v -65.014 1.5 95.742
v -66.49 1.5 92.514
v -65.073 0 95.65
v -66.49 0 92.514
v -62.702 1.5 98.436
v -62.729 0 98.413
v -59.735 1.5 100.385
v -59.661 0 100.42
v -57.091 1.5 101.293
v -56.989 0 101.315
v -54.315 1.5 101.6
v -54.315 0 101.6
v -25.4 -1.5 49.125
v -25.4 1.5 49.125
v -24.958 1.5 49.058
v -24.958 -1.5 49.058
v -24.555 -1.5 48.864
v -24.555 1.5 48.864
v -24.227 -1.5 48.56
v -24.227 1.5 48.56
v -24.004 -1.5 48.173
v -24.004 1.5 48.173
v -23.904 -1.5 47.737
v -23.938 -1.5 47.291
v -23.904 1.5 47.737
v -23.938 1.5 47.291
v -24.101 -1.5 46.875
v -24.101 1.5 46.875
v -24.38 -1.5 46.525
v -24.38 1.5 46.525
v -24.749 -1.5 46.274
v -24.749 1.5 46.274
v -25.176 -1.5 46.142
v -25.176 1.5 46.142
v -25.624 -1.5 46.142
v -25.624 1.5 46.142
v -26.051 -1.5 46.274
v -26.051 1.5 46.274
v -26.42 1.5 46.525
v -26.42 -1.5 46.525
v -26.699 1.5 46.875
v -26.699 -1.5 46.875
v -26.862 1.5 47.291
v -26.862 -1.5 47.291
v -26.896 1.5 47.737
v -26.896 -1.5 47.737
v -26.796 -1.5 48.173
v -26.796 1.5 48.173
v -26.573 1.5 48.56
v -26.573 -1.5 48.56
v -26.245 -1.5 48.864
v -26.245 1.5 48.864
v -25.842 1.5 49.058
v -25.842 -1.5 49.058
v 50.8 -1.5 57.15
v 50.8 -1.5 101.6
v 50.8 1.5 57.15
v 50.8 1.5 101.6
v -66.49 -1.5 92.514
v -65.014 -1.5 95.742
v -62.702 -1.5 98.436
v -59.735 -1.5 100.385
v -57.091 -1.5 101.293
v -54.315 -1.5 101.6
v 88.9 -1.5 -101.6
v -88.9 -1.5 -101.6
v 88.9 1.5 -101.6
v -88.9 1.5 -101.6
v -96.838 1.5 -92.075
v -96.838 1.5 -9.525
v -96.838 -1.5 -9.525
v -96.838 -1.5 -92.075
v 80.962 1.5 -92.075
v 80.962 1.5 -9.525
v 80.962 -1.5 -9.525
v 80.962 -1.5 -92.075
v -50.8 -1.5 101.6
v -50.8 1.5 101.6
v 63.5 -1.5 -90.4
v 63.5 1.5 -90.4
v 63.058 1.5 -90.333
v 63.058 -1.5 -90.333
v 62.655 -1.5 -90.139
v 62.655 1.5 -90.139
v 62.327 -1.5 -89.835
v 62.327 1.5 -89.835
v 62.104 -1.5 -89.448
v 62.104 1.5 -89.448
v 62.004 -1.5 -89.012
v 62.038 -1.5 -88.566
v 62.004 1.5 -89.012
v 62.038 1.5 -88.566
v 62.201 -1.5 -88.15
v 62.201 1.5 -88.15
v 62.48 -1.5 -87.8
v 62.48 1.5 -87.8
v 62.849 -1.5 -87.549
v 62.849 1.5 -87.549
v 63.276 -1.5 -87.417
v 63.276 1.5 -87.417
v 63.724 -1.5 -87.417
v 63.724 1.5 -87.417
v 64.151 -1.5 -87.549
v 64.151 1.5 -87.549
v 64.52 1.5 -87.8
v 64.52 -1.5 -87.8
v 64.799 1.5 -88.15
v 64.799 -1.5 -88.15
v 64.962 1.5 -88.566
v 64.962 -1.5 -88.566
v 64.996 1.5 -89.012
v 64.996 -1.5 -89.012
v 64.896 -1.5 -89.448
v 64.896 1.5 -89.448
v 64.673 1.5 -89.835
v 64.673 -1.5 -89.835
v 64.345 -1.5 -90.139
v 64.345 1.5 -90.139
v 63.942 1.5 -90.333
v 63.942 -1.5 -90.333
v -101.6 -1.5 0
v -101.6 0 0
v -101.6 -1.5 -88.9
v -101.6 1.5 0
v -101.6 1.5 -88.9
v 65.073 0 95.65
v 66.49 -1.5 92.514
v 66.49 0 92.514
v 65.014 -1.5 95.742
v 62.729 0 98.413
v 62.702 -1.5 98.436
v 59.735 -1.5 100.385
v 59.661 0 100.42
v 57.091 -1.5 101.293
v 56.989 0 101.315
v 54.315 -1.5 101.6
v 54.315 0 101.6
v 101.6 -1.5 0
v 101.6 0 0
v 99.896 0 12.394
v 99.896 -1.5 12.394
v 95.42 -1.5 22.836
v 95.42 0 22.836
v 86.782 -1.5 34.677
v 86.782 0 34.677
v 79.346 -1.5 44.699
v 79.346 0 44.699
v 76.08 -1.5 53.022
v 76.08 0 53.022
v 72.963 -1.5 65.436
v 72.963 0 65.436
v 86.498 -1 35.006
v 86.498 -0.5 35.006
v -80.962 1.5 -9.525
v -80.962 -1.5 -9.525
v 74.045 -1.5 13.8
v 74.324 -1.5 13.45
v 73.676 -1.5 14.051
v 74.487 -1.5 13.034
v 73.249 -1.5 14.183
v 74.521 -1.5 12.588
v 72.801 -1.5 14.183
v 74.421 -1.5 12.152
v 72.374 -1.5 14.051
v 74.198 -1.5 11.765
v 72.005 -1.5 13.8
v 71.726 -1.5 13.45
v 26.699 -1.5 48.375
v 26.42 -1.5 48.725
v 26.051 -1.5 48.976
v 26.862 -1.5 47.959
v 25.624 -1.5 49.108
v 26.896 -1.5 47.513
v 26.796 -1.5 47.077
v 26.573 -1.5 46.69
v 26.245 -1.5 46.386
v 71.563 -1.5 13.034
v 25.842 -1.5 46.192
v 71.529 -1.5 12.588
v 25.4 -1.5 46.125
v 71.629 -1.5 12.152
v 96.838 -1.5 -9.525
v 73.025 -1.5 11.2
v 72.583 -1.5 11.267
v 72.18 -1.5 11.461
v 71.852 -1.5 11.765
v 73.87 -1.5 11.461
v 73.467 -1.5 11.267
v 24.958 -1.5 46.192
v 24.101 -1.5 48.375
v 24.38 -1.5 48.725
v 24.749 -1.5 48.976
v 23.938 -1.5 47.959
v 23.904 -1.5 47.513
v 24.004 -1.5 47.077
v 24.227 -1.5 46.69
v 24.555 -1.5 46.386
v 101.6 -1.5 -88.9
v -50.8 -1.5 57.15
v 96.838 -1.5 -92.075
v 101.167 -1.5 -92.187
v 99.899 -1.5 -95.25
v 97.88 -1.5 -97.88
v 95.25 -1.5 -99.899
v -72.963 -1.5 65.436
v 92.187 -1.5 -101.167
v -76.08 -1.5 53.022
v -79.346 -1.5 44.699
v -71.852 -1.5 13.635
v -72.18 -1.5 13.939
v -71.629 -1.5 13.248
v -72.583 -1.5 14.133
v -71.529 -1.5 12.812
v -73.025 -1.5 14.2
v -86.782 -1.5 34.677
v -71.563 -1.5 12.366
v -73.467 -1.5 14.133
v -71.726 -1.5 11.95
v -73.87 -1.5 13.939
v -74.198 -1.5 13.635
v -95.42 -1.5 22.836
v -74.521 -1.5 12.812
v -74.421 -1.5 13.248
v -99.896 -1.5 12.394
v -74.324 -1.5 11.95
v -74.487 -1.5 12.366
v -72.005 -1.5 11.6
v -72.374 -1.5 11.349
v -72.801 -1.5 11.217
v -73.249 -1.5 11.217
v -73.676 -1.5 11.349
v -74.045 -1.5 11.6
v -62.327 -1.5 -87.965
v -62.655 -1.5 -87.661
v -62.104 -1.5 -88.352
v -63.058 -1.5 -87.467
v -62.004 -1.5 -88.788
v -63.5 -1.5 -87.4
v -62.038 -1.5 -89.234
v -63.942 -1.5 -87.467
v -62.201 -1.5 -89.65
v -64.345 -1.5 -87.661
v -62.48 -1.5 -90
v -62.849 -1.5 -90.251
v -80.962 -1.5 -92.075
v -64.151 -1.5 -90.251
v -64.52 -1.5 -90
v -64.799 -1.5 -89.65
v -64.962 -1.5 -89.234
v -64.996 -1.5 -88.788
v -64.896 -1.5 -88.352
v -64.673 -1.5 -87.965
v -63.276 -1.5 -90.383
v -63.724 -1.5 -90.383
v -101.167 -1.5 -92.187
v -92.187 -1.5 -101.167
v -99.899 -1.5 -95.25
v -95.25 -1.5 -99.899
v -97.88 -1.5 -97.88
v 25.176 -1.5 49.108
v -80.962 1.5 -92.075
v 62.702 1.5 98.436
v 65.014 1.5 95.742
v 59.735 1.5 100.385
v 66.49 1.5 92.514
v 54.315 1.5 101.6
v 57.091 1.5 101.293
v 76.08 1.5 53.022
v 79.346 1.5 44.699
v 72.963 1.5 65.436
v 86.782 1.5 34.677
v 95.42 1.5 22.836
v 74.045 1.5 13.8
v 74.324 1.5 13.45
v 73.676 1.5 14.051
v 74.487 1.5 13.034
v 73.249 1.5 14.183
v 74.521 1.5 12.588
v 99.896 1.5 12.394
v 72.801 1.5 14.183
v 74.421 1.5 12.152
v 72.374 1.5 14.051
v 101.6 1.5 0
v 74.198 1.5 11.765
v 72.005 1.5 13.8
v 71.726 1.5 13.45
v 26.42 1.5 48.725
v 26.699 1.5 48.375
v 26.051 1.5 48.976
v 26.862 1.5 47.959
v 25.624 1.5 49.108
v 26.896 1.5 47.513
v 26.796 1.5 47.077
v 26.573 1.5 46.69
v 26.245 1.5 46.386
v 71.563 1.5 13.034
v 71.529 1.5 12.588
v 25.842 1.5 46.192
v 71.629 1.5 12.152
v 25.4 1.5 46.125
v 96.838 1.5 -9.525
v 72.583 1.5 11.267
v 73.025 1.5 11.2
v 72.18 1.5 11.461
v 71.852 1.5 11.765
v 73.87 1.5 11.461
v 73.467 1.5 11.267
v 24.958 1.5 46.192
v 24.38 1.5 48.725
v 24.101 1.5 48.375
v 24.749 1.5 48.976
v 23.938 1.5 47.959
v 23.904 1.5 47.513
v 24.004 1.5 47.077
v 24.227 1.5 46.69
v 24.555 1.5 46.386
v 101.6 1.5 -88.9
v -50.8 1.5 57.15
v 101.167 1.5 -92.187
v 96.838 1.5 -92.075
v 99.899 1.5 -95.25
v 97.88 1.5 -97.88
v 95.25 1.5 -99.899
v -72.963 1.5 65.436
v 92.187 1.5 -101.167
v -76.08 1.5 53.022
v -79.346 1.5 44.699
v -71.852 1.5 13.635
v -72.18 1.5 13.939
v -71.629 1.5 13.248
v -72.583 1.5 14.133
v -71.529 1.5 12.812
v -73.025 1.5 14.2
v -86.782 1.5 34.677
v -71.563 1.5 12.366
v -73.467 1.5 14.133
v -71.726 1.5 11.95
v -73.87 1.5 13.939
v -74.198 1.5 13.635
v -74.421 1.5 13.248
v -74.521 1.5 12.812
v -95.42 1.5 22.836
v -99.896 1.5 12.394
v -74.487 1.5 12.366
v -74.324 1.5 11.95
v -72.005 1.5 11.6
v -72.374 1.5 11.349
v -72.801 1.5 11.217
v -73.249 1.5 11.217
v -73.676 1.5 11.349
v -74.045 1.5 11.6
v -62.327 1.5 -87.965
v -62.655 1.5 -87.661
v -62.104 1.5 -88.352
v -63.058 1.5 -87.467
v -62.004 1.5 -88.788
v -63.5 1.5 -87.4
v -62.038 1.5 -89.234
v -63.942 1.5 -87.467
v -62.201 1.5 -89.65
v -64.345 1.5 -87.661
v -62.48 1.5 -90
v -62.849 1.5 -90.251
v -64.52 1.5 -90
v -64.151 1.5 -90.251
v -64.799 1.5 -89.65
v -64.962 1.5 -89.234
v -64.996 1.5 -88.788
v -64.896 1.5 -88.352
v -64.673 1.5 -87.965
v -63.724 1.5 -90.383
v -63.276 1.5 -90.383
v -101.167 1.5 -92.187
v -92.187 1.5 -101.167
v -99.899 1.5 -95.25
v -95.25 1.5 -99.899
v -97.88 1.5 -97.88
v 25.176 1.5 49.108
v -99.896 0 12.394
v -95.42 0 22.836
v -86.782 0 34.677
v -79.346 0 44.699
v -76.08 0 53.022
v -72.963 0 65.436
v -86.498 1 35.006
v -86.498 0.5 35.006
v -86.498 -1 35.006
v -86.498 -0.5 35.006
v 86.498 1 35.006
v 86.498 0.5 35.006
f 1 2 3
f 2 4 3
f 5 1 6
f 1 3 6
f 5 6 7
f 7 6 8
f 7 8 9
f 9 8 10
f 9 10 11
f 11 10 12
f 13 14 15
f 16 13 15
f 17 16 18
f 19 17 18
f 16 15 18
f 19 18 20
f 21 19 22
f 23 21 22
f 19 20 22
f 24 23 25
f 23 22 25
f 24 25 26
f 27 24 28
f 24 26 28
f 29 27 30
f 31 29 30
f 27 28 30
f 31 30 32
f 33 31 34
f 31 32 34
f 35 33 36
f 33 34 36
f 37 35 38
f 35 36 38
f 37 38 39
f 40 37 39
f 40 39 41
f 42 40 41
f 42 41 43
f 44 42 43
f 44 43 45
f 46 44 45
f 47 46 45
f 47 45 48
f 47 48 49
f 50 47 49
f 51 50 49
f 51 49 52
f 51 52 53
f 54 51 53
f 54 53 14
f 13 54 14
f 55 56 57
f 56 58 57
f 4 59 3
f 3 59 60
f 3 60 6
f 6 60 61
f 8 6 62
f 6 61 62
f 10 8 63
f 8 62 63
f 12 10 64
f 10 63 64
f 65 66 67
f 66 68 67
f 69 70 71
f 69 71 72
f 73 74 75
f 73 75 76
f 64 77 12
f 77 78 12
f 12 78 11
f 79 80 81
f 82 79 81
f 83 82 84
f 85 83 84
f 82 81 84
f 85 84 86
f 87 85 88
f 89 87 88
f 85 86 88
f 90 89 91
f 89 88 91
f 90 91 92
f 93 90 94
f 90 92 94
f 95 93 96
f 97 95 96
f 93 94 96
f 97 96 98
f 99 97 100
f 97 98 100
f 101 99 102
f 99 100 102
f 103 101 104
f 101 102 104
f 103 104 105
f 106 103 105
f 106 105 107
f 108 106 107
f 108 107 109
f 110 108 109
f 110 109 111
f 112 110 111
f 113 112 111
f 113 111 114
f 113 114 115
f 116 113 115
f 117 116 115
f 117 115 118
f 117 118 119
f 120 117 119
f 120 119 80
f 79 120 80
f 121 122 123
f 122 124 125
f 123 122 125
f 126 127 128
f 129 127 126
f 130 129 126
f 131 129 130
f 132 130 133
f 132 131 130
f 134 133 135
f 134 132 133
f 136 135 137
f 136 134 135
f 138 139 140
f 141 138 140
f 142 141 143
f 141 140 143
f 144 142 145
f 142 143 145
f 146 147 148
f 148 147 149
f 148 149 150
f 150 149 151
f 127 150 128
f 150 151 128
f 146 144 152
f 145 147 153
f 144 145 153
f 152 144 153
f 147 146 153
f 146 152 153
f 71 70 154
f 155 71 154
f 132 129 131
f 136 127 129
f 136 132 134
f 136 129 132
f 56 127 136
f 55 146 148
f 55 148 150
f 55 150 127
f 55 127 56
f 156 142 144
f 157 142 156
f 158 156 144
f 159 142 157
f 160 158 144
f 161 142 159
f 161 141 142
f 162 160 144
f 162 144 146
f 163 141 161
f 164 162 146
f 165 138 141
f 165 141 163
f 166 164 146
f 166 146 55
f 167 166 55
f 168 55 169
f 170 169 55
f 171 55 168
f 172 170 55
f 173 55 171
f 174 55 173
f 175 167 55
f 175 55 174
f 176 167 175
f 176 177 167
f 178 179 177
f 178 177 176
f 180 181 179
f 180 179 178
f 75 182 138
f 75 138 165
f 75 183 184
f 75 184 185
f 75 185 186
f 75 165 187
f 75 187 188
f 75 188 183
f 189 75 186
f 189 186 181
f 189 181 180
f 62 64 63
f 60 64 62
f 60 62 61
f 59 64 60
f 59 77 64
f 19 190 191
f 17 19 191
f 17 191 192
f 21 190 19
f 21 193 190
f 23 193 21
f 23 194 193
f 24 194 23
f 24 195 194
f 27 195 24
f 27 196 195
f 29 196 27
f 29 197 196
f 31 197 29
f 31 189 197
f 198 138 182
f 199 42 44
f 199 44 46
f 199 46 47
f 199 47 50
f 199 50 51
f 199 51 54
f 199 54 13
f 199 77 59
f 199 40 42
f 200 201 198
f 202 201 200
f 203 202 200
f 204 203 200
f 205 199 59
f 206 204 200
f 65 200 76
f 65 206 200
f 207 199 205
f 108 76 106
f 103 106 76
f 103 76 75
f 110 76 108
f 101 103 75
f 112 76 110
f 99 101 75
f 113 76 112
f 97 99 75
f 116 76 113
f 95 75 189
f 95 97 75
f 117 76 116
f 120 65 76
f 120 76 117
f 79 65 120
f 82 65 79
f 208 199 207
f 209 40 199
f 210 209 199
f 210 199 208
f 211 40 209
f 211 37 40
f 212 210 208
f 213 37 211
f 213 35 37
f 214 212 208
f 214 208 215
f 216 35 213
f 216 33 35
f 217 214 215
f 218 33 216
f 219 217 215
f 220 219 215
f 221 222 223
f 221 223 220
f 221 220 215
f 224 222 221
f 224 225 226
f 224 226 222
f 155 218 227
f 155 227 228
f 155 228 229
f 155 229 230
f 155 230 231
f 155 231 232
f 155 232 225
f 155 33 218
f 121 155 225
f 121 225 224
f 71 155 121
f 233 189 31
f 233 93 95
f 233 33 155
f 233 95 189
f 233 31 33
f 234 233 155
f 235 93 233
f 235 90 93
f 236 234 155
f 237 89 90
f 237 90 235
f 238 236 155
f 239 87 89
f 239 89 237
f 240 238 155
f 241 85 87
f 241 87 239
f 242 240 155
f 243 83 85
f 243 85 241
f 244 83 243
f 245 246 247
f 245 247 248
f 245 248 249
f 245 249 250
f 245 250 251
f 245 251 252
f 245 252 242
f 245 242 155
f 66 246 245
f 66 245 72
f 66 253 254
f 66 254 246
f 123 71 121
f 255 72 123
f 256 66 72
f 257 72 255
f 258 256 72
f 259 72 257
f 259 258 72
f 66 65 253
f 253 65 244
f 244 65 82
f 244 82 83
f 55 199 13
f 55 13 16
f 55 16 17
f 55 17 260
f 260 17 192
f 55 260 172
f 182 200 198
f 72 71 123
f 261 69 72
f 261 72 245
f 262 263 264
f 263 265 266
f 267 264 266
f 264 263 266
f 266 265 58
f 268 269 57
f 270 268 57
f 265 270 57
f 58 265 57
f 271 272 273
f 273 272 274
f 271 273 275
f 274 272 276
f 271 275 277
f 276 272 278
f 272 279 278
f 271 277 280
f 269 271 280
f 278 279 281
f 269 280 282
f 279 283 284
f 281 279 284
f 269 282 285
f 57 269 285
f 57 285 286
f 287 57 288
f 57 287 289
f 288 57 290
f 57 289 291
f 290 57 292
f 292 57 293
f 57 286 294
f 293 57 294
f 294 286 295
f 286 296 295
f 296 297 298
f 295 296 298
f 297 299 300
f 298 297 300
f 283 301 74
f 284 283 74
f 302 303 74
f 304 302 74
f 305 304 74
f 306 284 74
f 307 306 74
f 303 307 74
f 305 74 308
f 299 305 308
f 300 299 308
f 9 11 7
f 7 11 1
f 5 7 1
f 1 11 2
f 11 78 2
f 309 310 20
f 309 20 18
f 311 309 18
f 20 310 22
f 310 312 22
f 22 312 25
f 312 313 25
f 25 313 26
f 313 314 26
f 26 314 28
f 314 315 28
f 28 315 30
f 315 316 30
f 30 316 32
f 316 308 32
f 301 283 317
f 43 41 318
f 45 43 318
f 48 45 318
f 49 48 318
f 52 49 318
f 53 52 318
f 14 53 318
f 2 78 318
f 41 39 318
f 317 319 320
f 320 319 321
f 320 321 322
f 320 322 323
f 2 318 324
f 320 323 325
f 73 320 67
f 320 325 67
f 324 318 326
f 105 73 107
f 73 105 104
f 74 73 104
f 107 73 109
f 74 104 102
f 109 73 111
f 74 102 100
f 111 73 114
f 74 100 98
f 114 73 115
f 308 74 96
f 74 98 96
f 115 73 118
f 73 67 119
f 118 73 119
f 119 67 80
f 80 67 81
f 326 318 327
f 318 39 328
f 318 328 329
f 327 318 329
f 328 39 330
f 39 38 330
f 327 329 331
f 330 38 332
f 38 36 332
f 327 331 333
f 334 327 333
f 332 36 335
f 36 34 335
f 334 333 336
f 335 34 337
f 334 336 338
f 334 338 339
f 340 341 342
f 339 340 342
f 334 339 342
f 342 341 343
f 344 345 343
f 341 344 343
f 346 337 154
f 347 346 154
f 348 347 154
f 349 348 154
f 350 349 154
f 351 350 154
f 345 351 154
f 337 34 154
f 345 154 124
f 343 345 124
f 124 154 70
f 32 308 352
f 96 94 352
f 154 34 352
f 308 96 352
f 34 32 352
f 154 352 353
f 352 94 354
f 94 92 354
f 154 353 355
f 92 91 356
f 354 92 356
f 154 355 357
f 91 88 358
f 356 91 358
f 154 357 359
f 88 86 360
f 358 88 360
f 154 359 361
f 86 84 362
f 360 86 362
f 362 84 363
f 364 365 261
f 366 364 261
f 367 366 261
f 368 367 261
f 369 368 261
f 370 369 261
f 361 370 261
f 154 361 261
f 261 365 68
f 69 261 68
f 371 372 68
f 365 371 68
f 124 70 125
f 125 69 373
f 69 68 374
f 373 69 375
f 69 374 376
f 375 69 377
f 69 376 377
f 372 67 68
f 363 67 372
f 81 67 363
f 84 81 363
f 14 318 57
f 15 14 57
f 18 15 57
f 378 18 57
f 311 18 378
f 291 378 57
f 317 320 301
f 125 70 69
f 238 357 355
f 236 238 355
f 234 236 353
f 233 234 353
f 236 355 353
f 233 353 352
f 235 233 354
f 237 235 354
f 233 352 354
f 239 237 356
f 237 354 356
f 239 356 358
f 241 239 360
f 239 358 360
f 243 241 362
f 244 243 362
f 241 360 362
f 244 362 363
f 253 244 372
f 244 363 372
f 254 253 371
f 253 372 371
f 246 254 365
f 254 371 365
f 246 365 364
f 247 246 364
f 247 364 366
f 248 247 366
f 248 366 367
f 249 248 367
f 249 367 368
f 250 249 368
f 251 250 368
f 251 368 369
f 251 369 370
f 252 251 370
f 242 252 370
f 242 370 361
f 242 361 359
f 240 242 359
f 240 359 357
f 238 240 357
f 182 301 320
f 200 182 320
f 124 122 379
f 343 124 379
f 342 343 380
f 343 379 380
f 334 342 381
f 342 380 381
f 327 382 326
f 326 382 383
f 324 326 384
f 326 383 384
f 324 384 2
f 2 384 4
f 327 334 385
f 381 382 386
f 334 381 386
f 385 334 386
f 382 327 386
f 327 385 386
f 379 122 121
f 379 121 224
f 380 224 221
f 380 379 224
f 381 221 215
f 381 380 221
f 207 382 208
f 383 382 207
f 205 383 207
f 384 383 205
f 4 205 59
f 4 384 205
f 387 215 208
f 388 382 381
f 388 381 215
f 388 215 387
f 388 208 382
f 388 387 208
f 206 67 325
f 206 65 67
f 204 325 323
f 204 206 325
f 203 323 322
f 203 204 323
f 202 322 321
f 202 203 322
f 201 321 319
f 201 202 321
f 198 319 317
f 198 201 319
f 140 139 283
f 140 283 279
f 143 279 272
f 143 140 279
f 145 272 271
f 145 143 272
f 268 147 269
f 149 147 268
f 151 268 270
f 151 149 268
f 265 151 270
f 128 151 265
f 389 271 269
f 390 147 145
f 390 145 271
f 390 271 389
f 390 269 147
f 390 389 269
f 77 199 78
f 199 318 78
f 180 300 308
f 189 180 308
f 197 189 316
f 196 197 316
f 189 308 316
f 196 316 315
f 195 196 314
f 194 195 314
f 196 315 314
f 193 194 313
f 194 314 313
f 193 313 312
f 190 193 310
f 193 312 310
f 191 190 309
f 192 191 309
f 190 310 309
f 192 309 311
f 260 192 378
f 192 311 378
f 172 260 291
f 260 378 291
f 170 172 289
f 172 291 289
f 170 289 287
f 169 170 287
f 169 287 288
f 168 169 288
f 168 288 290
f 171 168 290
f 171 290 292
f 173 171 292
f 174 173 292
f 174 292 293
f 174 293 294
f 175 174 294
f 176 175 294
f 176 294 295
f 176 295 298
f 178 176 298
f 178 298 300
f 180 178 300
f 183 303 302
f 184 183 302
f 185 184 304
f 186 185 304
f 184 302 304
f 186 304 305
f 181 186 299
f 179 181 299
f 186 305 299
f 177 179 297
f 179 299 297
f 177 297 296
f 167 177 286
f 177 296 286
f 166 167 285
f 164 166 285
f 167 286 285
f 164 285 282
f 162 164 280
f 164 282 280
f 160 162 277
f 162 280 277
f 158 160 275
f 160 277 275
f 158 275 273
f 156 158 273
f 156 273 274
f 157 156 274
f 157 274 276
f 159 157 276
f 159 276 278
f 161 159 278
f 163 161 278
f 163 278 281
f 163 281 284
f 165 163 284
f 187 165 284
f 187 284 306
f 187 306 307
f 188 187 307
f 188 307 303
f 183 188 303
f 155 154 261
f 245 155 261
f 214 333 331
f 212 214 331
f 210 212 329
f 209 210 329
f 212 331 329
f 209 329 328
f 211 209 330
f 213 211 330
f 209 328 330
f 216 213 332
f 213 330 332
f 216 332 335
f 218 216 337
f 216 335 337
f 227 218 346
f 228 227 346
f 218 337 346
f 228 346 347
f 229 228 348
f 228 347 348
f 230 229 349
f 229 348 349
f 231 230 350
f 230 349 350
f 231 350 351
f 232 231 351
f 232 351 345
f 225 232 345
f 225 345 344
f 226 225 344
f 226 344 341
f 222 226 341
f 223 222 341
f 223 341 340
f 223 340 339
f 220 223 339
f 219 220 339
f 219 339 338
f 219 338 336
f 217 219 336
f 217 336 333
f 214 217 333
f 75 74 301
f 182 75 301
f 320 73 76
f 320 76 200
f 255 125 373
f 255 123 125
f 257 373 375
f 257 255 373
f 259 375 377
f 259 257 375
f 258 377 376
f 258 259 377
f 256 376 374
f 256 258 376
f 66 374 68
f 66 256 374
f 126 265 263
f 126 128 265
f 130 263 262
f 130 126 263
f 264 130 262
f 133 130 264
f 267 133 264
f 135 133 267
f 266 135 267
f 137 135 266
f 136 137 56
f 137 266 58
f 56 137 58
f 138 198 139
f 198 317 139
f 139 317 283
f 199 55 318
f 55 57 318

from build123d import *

# Parameters (mm, degrees)
BOSS_EXTRUDE1_DEPTH = 1.5
SKETCH3_R           = 1.5
SKETCH3_W           = 15.875
SKETCH3_H           = 82.55
CUT_EXTRUDE1_DEPTH  = 144.715413374
FILLET1_R           = 12.7


with BuildPart() as part:
    # Sketch1 → Boss-Extrude1 (new, symmetric)
    with BuildSketch(Plane(origin=(0, 0, 0), x_dir=(1, 0, 0), z_dir=(0, 1, 0))):
        with BuildLine():
            Line((-101.6, 0), (-101.6, 101.6))
            Line((-101.6, 101.6), (101.6, 101.6))
            Line((101.6, 101.6), (101.6, 0))
            add(Edge.make_bspline(
                [(101.6, 0), (101.6, -15.24), (92.836364207, -28.257655975), (72.917051275, -49.879895788), (72.621677222, -76.538397804), (63.5, -101.6)],
                knots=[0, 0, 0, 0, 0.415380003, 0.515380003, 1, 1, 1, 1], degree=3))
            Line((63.5, -101.6), (50.8, -101.6))
            Line((50.8, -101.6), (50.8, -57.15))
            Line((50.8, -57.15), (-50.8, -57.15))
            Line((-50.8, -57.15), (-50.8, -101.6))
            Line((-50.8, -101.6), (-63.5, -101.6))
            add(Edge.make_bspline(
                [(-101.6, 0), (-101.6, -15.24), (-92.836364207, -28.257655975), (-72.917051275, -49.879895788), (-72.621677222, -76.538397804), (-63.5, -101.6)],
                knots=[0, 0, 0, 0, 0.415380003, 0.515380003, 1, 1, 1, 1], degree=3))
        make_face()
    extrude(amount=BOSS_EXTRUDE1_DEPTH, both=True)

    # Sketch3 → Cut-Extrude1 (cut, through all)
    with BuildSketch(Plane(origin=(0, 1.5, 0), x_dir=(1, 0, 0), z_dir=(0, 1, 0))):
        with Locations((-63.499999999, 88.9)):
            Circle(SKETCH3_R)
        with Locations((-73.024999999, -12.7)):
            Circle(SKETCH3_R)
        with Locations((-25.399999999, -47.625)):
            Circle(SKETCH3_R)
        with Locations((25.399999999, -47.625)):
            Circle(SKETCH3_R)
        with Locations((73.024999999, -12.7)):
            Circle(SKETCH3_R)
        with Locations((63.499999999, 88.9)):
            Circle(SKETCH3_R)
        with Locations((-88.9, 50.8)):
            Rectangle(SKETCH3_W, SKETCH3_H)
        with Locations((88.9, 50.8)):
            Rectangle(SKETCH3_W, SKETCH3_H)
    extrude(amount=-CUT_EXTRUDE1_DEPTH, mode=Mode.SUBTRACT)

    # Fillet1
    fillet1_edges = [part.edges().sort_by_distance(p)[0] for p in [
        (101.6, 0, -101.6),
        (-101.6, 0, -101.6),
        (-63.5, -0.75, 101.6),
        (63.5, -0.75, 101.6),
    ]]
    fillet(fillet1_edges, radius=FILLET1_R)


solid = part.part
